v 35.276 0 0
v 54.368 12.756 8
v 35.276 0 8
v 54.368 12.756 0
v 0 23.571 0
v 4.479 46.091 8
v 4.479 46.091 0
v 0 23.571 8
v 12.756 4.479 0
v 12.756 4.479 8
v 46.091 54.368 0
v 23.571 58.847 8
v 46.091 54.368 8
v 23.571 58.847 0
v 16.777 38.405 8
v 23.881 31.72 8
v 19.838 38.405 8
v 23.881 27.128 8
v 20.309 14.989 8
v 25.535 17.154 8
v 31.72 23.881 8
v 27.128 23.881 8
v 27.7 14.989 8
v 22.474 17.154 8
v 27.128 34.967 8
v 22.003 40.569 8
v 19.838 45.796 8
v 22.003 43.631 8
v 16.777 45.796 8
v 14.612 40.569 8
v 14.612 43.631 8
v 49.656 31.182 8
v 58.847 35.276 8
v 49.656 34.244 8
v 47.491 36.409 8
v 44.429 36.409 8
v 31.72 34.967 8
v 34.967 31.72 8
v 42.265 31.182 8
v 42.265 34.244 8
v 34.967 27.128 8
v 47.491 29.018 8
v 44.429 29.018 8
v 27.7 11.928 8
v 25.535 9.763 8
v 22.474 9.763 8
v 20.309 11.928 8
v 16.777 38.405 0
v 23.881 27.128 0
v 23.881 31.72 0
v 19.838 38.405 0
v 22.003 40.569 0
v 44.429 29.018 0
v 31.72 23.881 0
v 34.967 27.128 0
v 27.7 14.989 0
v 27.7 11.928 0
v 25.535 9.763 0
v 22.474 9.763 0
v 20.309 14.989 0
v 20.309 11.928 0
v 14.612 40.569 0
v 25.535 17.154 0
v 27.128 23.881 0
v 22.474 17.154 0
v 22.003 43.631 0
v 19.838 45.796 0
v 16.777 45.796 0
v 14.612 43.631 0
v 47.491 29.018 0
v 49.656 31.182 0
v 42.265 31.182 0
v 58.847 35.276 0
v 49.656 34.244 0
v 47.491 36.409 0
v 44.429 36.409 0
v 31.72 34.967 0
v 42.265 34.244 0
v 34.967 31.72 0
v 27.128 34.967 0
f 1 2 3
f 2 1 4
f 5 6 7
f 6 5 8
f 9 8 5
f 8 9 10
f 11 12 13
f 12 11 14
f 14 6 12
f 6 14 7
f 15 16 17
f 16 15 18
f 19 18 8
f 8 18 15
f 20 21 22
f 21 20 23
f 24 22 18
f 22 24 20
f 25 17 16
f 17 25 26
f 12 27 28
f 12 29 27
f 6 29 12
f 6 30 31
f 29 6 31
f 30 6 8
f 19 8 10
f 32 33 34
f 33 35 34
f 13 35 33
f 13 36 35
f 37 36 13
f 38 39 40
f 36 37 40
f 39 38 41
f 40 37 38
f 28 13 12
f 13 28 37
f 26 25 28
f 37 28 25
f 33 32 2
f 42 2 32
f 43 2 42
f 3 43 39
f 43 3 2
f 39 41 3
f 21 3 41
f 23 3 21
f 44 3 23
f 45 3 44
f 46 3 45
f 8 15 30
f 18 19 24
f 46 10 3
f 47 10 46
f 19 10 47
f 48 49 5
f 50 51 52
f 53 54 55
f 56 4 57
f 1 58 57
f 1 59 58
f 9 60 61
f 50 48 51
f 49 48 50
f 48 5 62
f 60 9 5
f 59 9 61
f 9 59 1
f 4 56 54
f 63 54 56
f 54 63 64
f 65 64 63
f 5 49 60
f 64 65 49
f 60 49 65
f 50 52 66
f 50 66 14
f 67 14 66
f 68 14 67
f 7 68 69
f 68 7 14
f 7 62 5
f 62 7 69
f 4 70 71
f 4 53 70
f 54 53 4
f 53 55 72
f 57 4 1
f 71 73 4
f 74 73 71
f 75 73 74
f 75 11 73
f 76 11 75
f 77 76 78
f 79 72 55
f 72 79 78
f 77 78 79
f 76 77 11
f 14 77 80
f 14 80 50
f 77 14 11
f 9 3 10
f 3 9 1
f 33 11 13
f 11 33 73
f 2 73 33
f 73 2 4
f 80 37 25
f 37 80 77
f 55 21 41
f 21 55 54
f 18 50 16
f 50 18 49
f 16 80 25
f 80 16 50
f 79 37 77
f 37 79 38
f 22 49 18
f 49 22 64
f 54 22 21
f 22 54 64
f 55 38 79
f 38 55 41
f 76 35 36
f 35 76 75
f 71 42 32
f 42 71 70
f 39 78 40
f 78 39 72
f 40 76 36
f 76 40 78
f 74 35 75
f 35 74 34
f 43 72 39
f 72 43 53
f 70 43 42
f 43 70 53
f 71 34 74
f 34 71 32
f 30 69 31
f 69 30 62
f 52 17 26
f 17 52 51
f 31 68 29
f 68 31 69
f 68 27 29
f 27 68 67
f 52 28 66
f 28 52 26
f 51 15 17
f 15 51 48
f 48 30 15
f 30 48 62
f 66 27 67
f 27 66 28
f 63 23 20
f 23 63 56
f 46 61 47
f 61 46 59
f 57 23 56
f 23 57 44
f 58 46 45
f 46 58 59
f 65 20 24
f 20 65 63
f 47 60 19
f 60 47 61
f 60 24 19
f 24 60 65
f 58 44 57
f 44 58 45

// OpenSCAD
$fn = 32;

// ----------------------------------------------------------------------
// Polygon plate: 8-gon R30, 3 bolt windows
// ----------------------------------------------------------------------

// --- parameters (mm) ---
sides = 8;                // number of polygon sides
plate_r = 30;             // circumscribed radius of the polygon
bore_r = 6;               // centre bore radius
bolts = 3;                // number of bolt windows
ring_r = 16.86;           // bolt-circle radius
bolt_r = 4;               // bolt window radius
plate_t = 8;              // plate thickness, Z (extrusion height)

plate_d = 2 * plate_r;  // circumscribed diameter
bore_d = 2 * bore_r;  // centre bore diameter
bolt_d = 2 * bolt_r;  // bolt window diameter
ring_d = 2 * ring_r;  // bolt-circle diameter

profile = [[58.847, 35.276], [46.091, 54.368], [23.571, 58.847], [4.479, 46.091], [0, 23.571], [12.756, 4.479], [35.276, 0], [54.368, 12.756]];  // primary outline, 8 points, counter clockwise
void_1 = [[34.967, 31.72], [31.72, 34.967], [27.128, 34.967], [23.881, 31.72], [23.881, 27.128], [27.128, 23.881], [31.72, 23.881], [34.967, 27.128]];  // centre bore, 8 points
void_2 = [[49.656, 34.244], [47.491, 36.409], [44.429, 36.409], [42.265, 34.244], [42.265, 31.182], [44.429, 29.018], [47.491, 29.018], [49.656, 31.182]];  // bolt window 1, 8 points
void_3 = [[22.003, 43.631], [19.838, 45.796], [16.777, 45.796], [14.612, 43.631], [14.612, 40.569], [16.777, 38.405], [19.838, 38.405], [22.003, 40.569]];  // bolt window 2, 8 points
void_4 = [[27.7, 14.989], [25.535, 17.154], [22.474, 17.154], [20.309, 14.989], [20.309, 11.928], [22.474, 9.763], [25.535, 9.763], [27.7, 11.928]];  // bolt window 3, 8 points

// --- the one profile operation ---
difference() {
  linear_extrude(height = plate_t) polygon(points = profile);
  translate([0, 0, -1])
    linear_extrude(height = plate_t + 2) polygon(points = void_1);
  translate([0, 0, -1])
    linear_extrude(height = plate_t + 2) polygon(points = void_2);
  translate([0, 0, -1])
    linear_extrude(height = plate_t + 2) polygon(points = void_3);
  translate([0, 0, -1])
    linear_extrude(height = plate_t + 2) polygon(points = void_4);
}
